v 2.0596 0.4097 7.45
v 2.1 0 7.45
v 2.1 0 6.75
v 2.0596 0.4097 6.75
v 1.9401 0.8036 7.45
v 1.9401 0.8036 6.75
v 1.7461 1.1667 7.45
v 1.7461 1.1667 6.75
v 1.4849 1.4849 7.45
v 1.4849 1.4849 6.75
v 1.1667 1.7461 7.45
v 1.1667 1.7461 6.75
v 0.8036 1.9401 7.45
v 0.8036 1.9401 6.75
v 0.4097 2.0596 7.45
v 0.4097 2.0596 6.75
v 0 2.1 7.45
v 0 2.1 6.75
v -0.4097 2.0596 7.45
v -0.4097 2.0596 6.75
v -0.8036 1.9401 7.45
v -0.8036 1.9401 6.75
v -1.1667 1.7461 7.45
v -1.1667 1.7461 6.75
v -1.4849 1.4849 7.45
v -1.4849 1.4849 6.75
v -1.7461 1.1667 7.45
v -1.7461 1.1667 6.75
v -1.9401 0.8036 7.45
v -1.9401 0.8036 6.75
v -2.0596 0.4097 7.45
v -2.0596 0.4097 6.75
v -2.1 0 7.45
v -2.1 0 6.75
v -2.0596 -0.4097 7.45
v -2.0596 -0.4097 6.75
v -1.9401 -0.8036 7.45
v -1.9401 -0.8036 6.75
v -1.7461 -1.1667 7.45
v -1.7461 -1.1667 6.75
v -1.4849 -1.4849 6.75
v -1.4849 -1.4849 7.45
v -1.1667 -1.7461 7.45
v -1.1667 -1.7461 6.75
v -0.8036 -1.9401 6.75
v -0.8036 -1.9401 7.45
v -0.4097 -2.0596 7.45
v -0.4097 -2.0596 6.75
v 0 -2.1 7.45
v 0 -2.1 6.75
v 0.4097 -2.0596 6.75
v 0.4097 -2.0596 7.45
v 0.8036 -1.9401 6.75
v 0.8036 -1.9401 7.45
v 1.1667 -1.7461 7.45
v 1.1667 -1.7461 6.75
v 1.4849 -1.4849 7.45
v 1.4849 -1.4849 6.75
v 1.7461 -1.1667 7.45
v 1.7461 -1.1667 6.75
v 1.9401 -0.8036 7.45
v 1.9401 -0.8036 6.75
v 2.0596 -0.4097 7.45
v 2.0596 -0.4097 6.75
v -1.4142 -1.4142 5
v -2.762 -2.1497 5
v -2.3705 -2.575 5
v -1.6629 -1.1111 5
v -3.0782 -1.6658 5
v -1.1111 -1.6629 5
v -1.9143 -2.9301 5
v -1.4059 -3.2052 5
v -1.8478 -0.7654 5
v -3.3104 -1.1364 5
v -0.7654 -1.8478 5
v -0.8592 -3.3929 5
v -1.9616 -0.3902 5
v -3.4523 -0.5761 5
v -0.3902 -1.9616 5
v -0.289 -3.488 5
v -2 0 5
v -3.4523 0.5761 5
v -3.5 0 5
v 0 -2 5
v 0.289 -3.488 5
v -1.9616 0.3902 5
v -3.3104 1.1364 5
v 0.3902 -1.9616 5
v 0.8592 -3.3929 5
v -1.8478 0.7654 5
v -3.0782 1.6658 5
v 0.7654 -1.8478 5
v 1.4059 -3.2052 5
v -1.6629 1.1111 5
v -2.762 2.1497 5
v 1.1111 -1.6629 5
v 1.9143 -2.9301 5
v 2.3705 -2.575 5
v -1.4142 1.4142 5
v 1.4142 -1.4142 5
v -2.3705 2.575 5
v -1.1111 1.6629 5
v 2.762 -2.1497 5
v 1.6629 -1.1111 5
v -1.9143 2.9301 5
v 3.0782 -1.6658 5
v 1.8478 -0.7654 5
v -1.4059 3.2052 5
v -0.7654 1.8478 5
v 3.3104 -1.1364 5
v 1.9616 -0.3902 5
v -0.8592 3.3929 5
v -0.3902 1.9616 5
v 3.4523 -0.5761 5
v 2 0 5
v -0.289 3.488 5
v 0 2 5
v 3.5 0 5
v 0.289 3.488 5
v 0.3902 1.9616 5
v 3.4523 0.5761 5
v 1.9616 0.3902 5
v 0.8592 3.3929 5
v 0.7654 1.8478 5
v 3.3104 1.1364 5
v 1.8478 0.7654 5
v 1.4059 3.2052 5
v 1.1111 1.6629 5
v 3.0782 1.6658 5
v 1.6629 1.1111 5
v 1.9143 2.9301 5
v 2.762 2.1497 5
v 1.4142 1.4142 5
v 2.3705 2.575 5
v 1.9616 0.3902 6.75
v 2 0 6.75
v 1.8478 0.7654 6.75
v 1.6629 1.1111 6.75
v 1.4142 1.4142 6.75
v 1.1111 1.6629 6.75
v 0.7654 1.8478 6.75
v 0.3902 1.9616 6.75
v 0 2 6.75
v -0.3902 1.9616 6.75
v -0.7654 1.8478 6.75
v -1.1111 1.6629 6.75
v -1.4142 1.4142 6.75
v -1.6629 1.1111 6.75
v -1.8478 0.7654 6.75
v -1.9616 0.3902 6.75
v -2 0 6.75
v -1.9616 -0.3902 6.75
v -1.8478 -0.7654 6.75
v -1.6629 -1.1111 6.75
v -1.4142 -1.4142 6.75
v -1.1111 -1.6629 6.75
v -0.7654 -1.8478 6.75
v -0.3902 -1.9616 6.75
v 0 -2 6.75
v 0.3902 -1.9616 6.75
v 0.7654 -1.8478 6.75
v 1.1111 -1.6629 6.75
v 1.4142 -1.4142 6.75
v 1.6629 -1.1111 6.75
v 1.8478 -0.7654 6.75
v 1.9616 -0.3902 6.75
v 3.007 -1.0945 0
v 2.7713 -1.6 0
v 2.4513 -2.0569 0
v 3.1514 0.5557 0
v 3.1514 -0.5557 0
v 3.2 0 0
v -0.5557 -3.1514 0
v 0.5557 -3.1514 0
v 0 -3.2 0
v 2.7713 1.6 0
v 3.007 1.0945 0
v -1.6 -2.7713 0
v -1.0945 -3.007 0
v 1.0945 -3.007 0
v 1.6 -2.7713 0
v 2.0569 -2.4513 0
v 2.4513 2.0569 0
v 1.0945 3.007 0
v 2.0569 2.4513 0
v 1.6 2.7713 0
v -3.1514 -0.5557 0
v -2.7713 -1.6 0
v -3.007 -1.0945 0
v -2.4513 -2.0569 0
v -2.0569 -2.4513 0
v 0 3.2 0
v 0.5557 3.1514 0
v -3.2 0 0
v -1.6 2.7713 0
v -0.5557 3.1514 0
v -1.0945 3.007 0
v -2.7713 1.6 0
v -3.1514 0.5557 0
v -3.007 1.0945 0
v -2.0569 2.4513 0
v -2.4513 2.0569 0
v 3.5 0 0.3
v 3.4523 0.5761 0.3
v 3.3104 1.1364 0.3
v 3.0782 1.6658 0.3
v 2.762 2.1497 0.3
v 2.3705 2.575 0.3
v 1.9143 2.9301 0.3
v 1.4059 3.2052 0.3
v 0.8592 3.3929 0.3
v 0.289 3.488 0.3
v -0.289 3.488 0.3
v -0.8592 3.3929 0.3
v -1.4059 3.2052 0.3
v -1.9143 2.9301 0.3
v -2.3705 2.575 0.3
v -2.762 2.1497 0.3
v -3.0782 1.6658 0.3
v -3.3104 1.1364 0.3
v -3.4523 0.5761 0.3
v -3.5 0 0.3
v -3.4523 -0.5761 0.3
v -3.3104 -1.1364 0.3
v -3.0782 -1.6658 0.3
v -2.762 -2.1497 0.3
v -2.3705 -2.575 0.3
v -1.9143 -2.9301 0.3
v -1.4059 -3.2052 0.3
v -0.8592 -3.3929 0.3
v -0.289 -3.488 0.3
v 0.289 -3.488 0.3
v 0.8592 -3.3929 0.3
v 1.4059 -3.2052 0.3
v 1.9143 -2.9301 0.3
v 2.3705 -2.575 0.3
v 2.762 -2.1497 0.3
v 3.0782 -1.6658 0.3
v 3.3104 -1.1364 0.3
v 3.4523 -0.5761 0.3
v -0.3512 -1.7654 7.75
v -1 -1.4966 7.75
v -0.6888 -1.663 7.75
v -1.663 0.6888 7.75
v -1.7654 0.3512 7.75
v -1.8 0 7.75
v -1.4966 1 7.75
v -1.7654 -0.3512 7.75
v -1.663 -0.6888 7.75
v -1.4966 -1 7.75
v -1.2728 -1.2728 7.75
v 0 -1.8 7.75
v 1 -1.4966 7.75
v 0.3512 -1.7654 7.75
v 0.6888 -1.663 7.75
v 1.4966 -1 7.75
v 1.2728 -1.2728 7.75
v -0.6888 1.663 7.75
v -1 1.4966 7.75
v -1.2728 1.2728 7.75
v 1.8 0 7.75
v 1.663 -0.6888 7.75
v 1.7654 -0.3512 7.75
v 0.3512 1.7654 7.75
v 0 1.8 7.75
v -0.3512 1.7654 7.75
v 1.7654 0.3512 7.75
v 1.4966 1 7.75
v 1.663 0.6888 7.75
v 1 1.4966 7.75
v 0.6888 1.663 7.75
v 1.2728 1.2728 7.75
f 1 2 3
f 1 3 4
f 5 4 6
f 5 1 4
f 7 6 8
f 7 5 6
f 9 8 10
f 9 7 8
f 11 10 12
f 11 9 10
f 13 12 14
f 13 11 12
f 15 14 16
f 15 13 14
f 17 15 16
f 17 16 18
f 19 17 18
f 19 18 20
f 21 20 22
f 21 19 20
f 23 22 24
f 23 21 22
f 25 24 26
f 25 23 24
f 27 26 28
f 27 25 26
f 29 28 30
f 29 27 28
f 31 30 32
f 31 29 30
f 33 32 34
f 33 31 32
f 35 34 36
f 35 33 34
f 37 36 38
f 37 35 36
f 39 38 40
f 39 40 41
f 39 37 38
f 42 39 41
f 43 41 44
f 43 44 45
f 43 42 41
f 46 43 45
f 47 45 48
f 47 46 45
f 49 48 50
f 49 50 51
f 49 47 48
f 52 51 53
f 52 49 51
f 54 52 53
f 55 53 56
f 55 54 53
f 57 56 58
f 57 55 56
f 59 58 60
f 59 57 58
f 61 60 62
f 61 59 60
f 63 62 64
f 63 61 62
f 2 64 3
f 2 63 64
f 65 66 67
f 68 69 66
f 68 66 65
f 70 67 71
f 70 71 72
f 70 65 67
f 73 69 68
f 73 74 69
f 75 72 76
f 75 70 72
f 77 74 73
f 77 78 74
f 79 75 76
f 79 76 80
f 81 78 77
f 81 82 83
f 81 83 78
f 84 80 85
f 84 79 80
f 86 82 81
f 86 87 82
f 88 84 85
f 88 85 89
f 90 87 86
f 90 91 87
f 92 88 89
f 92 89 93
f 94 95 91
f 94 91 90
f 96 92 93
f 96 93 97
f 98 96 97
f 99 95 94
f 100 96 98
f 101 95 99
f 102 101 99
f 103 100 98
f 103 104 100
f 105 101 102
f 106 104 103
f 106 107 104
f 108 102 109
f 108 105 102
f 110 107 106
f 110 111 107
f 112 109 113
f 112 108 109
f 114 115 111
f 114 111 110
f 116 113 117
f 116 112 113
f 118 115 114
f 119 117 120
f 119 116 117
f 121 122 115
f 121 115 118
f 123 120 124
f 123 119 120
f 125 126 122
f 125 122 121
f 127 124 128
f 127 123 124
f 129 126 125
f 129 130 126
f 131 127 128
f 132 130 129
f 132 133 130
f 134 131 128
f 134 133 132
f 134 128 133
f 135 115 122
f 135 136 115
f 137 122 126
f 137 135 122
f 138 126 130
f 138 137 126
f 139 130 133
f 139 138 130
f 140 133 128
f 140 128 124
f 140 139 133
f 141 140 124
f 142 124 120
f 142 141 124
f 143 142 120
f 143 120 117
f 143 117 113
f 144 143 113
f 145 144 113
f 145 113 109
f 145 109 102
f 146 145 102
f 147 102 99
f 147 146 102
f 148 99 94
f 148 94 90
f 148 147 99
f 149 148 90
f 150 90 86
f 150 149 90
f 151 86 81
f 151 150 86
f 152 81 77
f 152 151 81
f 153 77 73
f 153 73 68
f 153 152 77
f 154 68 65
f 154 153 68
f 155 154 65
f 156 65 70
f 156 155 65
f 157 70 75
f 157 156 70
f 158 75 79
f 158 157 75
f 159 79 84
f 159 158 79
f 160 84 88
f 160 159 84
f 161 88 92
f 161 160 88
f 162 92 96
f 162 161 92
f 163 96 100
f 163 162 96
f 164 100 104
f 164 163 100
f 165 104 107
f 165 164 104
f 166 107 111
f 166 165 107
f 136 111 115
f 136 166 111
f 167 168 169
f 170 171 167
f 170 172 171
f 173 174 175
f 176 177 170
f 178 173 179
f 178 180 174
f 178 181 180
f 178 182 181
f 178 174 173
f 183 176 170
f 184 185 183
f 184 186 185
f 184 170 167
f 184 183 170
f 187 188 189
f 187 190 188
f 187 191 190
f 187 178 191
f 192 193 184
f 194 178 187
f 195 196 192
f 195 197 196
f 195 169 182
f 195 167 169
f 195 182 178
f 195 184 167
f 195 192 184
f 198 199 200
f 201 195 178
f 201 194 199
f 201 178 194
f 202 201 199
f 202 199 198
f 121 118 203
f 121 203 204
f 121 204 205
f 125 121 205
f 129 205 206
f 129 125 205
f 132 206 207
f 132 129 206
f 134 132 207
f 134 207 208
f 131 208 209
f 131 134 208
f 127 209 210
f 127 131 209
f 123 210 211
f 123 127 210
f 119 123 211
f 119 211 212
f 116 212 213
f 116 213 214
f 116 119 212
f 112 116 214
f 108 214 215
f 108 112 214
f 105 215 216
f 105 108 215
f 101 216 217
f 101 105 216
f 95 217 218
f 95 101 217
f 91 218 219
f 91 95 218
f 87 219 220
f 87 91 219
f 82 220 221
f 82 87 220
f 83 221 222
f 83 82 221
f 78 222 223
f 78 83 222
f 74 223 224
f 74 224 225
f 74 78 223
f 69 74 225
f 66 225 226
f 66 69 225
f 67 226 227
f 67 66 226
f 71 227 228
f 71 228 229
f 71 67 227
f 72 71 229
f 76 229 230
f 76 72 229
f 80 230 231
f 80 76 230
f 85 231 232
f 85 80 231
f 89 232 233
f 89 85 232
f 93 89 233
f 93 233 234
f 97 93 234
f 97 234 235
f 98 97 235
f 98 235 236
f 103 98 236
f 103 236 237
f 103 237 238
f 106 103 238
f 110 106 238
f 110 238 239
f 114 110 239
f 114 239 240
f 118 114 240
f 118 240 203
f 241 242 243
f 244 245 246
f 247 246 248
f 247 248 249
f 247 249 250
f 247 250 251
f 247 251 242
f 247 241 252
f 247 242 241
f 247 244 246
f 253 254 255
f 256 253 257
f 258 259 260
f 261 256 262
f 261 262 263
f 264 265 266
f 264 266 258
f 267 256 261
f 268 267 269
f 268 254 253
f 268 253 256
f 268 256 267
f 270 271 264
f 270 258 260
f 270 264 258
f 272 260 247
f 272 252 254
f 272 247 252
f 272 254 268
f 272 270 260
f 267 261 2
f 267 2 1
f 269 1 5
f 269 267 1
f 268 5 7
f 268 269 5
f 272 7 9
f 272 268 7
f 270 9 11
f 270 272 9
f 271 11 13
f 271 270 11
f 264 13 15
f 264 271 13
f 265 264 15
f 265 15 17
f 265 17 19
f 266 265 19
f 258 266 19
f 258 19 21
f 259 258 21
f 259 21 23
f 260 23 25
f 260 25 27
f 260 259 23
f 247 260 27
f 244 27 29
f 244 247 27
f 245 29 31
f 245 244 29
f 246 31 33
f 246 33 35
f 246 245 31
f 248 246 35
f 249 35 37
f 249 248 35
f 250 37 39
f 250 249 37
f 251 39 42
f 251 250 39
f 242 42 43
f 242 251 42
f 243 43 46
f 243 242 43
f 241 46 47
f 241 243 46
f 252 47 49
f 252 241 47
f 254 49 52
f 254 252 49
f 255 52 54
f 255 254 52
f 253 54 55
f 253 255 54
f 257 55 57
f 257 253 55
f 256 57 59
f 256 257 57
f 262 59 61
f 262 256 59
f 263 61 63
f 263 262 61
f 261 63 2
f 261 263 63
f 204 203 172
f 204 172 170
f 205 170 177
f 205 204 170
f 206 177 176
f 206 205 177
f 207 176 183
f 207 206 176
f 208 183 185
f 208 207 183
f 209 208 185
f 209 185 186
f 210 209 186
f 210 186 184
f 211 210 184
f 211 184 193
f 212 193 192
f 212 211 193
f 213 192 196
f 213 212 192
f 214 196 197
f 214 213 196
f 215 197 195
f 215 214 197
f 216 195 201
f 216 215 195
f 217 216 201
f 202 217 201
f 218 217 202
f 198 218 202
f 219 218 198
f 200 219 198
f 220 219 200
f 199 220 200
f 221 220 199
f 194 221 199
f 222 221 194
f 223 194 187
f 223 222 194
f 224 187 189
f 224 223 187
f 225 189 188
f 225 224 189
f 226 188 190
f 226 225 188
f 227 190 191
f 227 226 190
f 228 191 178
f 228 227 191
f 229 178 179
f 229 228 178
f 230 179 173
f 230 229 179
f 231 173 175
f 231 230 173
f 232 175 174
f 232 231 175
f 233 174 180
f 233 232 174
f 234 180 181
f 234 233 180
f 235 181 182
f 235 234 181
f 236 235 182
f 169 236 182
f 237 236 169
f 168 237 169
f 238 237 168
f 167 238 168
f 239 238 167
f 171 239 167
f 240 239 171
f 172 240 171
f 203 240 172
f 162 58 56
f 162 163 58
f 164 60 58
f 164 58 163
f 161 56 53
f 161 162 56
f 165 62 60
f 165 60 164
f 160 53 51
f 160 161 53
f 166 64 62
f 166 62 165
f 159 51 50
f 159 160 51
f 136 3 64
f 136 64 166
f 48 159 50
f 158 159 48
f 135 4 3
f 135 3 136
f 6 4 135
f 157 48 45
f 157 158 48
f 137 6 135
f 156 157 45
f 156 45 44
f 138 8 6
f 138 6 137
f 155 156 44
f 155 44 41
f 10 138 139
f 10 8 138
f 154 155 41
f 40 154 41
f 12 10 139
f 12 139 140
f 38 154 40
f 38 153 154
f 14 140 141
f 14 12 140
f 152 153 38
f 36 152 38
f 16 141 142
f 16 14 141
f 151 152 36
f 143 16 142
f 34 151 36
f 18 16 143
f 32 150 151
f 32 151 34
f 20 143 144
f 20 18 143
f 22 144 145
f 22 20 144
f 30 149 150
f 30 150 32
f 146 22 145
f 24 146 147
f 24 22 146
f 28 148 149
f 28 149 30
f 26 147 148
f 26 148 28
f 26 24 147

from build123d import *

# Parameters (mm, degrees)
F0_W    = 2
F0_H    = 1.75
F2_SIZE = 0.3


with BuildPart() as f1:
    # F0 (on Front) → F1 (revolve)
    with BuildSketch(Plane.XZ):
        Polygon((0, 5), (0, 0), (3.5, 0), (3.5, 5), (2, 5), align=None)
        with Locations((1, 5.875)):
            Rectangle(F0_W, F0_H)
        Polygon((0, 7.75), (0, 6.75), (2, 6.75), (2.1, 6.75), (2.1, 7.75), align=None)
    revolve(axis=Axis((0, 0, 2.5), (0, 0, 1)))

    # F2
    f2_edges = [f1.edges().sort_by_distance(p)[0] for p in [
        (-2.1, 0, 7.75),
        (-3.5, 0, 0),
    ]]
    chamfer(f2_edges, length=F2_SIZE)


solid = f1.part
